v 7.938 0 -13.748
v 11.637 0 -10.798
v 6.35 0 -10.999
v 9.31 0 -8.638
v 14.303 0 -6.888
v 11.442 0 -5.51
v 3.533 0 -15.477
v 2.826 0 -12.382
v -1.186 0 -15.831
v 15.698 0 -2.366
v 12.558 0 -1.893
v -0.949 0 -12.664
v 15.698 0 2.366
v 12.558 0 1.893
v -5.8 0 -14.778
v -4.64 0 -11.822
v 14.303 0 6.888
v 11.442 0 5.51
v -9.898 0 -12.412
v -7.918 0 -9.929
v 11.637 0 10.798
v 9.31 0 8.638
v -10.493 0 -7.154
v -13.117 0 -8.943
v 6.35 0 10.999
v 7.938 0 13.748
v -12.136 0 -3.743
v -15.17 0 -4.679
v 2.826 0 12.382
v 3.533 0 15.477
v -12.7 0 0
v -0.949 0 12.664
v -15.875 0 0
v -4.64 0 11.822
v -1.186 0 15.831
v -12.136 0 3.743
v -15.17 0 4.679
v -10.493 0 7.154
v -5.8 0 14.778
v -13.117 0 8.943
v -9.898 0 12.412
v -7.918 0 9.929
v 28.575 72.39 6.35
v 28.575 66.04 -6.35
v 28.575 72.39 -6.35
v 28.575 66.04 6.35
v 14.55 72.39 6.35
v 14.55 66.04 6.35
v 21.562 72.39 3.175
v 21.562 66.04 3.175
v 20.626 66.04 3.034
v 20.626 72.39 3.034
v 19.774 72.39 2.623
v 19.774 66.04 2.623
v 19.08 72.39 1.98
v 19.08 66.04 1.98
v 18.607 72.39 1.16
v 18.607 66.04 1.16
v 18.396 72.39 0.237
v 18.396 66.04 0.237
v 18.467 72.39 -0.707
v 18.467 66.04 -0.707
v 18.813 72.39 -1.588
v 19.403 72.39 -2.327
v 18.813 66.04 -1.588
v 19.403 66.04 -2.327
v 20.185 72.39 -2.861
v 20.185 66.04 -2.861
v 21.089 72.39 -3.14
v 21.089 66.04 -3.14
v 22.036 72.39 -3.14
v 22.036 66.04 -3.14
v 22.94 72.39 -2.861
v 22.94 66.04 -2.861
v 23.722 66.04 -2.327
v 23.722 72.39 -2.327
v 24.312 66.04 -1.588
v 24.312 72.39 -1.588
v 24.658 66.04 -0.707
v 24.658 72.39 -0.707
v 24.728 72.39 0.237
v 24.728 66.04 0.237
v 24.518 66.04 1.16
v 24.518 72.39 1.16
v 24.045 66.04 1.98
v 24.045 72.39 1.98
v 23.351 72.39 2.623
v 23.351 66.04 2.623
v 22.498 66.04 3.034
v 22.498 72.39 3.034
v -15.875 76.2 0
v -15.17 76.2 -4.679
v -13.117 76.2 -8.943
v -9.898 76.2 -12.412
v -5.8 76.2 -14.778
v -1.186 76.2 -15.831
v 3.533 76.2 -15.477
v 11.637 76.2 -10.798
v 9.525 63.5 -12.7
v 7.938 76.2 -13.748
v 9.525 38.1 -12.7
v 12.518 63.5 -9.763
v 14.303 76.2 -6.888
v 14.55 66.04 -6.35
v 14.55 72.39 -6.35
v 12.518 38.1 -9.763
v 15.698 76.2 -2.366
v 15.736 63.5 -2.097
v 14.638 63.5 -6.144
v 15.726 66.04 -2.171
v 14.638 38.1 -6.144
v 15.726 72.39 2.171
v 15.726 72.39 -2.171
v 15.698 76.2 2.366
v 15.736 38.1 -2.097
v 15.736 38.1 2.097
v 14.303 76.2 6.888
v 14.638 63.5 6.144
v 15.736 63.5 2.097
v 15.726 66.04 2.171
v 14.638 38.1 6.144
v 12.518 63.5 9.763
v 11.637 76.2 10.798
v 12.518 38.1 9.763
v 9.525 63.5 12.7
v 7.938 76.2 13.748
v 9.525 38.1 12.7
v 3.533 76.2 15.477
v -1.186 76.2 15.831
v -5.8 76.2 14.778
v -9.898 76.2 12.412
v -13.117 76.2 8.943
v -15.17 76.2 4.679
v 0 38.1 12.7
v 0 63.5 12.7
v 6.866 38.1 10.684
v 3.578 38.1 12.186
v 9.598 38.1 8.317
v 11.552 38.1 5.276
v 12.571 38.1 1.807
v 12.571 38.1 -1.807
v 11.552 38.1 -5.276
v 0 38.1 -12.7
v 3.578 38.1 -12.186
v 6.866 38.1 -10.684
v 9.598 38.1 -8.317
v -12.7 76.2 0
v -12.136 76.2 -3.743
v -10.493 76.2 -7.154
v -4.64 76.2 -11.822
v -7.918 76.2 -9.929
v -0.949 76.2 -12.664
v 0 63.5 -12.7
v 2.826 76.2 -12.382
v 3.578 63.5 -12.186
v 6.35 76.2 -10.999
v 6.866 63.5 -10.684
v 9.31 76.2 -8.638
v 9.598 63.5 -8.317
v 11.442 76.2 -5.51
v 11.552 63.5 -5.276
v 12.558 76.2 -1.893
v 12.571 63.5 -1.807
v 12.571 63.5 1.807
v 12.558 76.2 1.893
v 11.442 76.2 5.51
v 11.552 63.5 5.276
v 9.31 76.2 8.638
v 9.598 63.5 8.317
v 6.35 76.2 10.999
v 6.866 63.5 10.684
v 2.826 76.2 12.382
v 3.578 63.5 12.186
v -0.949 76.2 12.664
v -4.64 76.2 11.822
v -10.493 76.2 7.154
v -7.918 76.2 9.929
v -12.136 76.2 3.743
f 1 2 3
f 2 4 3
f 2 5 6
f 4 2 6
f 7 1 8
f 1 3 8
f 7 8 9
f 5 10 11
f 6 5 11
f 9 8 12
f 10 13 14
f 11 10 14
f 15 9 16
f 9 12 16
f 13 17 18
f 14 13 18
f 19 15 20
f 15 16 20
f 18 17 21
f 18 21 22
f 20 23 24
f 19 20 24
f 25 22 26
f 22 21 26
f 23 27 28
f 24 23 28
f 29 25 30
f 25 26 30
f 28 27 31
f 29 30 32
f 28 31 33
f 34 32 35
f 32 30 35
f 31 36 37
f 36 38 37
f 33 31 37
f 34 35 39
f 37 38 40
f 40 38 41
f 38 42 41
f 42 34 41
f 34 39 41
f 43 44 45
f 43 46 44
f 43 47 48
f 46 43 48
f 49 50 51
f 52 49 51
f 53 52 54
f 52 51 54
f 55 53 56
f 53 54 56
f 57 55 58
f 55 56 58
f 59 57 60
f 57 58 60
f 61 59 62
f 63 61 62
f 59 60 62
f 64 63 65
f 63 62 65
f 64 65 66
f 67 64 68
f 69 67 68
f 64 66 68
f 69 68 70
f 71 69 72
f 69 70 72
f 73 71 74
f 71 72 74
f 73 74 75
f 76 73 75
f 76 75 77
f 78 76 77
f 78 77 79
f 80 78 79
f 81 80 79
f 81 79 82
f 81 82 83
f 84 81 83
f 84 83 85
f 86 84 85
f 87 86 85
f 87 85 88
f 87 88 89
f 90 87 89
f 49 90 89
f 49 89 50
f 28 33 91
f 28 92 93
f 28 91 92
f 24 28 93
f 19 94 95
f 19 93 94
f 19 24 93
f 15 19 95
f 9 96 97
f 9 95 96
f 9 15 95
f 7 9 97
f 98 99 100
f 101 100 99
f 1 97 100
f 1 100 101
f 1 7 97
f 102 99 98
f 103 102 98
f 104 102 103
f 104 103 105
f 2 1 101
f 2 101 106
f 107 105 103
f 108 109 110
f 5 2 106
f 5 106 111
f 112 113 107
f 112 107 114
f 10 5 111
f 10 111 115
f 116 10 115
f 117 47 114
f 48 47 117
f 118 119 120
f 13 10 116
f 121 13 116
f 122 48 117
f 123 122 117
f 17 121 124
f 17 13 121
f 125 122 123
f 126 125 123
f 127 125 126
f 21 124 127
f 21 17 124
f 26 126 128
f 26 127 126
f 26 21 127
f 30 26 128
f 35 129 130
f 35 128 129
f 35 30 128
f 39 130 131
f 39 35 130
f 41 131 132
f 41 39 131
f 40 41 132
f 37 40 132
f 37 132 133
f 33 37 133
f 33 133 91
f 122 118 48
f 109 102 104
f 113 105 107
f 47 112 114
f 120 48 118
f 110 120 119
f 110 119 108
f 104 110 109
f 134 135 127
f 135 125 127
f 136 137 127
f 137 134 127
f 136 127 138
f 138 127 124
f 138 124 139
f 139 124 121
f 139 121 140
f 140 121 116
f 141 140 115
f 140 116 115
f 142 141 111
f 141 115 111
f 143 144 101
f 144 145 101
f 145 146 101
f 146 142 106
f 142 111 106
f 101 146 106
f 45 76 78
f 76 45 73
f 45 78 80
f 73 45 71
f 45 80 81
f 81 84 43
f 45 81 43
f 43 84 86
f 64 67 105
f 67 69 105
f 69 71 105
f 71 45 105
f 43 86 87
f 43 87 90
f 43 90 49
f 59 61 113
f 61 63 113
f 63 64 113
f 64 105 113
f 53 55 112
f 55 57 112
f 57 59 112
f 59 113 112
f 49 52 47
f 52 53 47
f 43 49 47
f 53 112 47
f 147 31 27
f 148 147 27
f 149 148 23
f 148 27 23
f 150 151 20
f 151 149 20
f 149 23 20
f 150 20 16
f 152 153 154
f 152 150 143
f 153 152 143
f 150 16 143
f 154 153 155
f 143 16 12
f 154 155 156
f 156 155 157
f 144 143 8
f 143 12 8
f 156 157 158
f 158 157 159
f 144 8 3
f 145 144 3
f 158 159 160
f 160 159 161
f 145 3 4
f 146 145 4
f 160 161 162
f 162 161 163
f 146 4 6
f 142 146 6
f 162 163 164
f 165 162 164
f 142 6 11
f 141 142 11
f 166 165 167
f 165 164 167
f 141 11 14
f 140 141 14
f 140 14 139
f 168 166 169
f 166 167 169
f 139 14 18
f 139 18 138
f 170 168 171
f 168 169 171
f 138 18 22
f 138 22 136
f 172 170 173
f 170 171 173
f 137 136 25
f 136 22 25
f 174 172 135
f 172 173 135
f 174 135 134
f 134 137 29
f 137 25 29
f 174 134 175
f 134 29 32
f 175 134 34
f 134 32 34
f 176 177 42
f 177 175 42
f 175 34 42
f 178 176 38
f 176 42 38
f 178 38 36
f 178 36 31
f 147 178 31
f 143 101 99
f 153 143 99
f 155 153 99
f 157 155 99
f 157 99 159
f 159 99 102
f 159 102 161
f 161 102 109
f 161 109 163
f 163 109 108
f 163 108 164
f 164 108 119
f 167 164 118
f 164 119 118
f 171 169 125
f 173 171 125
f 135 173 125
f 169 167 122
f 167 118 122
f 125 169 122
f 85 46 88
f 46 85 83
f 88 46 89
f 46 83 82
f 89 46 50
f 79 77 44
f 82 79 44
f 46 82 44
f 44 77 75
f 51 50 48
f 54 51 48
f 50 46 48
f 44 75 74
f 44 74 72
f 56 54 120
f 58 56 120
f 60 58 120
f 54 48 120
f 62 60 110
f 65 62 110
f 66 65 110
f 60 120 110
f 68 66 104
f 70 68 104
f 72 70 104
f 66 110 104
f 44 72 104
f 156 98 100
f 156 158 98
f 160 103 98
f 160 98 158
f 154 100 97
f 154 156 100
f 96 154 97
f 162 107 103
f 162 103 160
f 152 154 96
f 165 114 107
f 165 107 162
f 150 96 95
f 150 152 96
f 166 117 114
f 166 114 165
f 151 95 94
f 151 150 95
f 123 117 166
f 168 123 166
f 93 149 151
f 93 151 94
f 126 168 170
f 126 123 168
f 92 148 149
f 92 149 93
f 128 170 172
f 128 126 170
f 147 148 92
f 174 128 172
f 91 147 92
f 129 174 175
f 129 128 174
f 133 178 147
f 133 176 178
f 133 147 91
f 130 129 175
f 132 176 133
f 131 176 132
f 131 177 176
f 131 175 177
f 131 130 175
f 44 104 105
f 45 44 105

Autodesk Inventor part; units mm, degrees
ref_plane "XZ Plane" through (0, 0, 0) normal (0, 1, 0) x (-1, 0, 0)
ref_plane "XY Plane" through (0, 0, 0) normal (0, 0, 1) x (1, 0, 0)
sketch "Sketch1" plane through (0, 0, 0) normal (0, 1, 0) x (-1, 0, 0)
  circle A0 centre (0, 0) radius 12.7
  circle A1 centre (0, 0) radius 15.875
  dimension "d0" = 25.4
  dimension "d1" = 3.175
extrude "Extrusion1" add sketch "Sketch1" along normal blind 76.2
ref_plane "Work Plane1" through (15.875, 0, 0) normal (1, 0, 0) x (0, 1, 0)
sketch "Sketch2" plane through (15.875, 0, 0) normal (1, 0, 0) x (0, 1, 0)
  line L0 (63.5, 12.7) -> (38.1, 12.7)
  line L1 (38.1, 12.7) -> (38.1, -12.7)
  line L2 (38.1, -12.7) -> (63.5, -12.7)
  line L3 (63.5, -12.7) -> (63.5, 12.7)
  line L4 (76.2, -15.875) -> (76.2, 15.875) projected
  line L5 (72.39, 6.35) -> (66.04, 6.35)
  line L6 (66.04, 6.35) -> (66.04, -6.35)
  line L7 (66.04, -6.35) -> (72.39, -6.35)
  line L8 (72.39, -6.35) -> (72.39, 6.35)
  point P0 (0, 0)
  point P1 (63.5, 0)
  point P2 (66.04, 0)
  dimension "d4" = 25.4
  dimension "d5" = 25.4
  dimension "d6" = 12.7
  dimension "d7" = 2.54
  dimension "d8" = 6.35
  dimension "d13" = 12.7
extrude "Extrusion2" cut sketch "Sketch2" against normal up to next contours L3 L2 L1 L0
extrude "Extrusion3" add sketch "Sketch2" along normal blind 12.7 contours L8 L7 L6 L5
sketch "Sketch3" plane through (15.875, 72.39, 0) normal (0, 1, 0) x (1, 0, 0)
  point P0 (-15.875, 0)
extrude "Extrusion4" add sketch "Sketch2" against normal up to next contours L8 L7 L6 L5
sketch "Sketch4" plane through (14.5497, 72.39, 6.35) normal (0, 1, 0) x (1, 0, 0)
  line L0 (0, 12.7) -> (14.0253, 12.7) projected
  line L1 (14.0253, 12.7) -> (14.0253, 0) projected
  point P0 (-14.5497, 6.35)
  point P1 (7.0127, 6.35)
  point P2 (7.0127, 12.7)
  point P3 (14.0253, 6.35)
hole "Hole1" at (21.5623, 72.39, 0) direction (0, -1, 0) diameter 6.35 end up to surface
properties part number "MainBody"
